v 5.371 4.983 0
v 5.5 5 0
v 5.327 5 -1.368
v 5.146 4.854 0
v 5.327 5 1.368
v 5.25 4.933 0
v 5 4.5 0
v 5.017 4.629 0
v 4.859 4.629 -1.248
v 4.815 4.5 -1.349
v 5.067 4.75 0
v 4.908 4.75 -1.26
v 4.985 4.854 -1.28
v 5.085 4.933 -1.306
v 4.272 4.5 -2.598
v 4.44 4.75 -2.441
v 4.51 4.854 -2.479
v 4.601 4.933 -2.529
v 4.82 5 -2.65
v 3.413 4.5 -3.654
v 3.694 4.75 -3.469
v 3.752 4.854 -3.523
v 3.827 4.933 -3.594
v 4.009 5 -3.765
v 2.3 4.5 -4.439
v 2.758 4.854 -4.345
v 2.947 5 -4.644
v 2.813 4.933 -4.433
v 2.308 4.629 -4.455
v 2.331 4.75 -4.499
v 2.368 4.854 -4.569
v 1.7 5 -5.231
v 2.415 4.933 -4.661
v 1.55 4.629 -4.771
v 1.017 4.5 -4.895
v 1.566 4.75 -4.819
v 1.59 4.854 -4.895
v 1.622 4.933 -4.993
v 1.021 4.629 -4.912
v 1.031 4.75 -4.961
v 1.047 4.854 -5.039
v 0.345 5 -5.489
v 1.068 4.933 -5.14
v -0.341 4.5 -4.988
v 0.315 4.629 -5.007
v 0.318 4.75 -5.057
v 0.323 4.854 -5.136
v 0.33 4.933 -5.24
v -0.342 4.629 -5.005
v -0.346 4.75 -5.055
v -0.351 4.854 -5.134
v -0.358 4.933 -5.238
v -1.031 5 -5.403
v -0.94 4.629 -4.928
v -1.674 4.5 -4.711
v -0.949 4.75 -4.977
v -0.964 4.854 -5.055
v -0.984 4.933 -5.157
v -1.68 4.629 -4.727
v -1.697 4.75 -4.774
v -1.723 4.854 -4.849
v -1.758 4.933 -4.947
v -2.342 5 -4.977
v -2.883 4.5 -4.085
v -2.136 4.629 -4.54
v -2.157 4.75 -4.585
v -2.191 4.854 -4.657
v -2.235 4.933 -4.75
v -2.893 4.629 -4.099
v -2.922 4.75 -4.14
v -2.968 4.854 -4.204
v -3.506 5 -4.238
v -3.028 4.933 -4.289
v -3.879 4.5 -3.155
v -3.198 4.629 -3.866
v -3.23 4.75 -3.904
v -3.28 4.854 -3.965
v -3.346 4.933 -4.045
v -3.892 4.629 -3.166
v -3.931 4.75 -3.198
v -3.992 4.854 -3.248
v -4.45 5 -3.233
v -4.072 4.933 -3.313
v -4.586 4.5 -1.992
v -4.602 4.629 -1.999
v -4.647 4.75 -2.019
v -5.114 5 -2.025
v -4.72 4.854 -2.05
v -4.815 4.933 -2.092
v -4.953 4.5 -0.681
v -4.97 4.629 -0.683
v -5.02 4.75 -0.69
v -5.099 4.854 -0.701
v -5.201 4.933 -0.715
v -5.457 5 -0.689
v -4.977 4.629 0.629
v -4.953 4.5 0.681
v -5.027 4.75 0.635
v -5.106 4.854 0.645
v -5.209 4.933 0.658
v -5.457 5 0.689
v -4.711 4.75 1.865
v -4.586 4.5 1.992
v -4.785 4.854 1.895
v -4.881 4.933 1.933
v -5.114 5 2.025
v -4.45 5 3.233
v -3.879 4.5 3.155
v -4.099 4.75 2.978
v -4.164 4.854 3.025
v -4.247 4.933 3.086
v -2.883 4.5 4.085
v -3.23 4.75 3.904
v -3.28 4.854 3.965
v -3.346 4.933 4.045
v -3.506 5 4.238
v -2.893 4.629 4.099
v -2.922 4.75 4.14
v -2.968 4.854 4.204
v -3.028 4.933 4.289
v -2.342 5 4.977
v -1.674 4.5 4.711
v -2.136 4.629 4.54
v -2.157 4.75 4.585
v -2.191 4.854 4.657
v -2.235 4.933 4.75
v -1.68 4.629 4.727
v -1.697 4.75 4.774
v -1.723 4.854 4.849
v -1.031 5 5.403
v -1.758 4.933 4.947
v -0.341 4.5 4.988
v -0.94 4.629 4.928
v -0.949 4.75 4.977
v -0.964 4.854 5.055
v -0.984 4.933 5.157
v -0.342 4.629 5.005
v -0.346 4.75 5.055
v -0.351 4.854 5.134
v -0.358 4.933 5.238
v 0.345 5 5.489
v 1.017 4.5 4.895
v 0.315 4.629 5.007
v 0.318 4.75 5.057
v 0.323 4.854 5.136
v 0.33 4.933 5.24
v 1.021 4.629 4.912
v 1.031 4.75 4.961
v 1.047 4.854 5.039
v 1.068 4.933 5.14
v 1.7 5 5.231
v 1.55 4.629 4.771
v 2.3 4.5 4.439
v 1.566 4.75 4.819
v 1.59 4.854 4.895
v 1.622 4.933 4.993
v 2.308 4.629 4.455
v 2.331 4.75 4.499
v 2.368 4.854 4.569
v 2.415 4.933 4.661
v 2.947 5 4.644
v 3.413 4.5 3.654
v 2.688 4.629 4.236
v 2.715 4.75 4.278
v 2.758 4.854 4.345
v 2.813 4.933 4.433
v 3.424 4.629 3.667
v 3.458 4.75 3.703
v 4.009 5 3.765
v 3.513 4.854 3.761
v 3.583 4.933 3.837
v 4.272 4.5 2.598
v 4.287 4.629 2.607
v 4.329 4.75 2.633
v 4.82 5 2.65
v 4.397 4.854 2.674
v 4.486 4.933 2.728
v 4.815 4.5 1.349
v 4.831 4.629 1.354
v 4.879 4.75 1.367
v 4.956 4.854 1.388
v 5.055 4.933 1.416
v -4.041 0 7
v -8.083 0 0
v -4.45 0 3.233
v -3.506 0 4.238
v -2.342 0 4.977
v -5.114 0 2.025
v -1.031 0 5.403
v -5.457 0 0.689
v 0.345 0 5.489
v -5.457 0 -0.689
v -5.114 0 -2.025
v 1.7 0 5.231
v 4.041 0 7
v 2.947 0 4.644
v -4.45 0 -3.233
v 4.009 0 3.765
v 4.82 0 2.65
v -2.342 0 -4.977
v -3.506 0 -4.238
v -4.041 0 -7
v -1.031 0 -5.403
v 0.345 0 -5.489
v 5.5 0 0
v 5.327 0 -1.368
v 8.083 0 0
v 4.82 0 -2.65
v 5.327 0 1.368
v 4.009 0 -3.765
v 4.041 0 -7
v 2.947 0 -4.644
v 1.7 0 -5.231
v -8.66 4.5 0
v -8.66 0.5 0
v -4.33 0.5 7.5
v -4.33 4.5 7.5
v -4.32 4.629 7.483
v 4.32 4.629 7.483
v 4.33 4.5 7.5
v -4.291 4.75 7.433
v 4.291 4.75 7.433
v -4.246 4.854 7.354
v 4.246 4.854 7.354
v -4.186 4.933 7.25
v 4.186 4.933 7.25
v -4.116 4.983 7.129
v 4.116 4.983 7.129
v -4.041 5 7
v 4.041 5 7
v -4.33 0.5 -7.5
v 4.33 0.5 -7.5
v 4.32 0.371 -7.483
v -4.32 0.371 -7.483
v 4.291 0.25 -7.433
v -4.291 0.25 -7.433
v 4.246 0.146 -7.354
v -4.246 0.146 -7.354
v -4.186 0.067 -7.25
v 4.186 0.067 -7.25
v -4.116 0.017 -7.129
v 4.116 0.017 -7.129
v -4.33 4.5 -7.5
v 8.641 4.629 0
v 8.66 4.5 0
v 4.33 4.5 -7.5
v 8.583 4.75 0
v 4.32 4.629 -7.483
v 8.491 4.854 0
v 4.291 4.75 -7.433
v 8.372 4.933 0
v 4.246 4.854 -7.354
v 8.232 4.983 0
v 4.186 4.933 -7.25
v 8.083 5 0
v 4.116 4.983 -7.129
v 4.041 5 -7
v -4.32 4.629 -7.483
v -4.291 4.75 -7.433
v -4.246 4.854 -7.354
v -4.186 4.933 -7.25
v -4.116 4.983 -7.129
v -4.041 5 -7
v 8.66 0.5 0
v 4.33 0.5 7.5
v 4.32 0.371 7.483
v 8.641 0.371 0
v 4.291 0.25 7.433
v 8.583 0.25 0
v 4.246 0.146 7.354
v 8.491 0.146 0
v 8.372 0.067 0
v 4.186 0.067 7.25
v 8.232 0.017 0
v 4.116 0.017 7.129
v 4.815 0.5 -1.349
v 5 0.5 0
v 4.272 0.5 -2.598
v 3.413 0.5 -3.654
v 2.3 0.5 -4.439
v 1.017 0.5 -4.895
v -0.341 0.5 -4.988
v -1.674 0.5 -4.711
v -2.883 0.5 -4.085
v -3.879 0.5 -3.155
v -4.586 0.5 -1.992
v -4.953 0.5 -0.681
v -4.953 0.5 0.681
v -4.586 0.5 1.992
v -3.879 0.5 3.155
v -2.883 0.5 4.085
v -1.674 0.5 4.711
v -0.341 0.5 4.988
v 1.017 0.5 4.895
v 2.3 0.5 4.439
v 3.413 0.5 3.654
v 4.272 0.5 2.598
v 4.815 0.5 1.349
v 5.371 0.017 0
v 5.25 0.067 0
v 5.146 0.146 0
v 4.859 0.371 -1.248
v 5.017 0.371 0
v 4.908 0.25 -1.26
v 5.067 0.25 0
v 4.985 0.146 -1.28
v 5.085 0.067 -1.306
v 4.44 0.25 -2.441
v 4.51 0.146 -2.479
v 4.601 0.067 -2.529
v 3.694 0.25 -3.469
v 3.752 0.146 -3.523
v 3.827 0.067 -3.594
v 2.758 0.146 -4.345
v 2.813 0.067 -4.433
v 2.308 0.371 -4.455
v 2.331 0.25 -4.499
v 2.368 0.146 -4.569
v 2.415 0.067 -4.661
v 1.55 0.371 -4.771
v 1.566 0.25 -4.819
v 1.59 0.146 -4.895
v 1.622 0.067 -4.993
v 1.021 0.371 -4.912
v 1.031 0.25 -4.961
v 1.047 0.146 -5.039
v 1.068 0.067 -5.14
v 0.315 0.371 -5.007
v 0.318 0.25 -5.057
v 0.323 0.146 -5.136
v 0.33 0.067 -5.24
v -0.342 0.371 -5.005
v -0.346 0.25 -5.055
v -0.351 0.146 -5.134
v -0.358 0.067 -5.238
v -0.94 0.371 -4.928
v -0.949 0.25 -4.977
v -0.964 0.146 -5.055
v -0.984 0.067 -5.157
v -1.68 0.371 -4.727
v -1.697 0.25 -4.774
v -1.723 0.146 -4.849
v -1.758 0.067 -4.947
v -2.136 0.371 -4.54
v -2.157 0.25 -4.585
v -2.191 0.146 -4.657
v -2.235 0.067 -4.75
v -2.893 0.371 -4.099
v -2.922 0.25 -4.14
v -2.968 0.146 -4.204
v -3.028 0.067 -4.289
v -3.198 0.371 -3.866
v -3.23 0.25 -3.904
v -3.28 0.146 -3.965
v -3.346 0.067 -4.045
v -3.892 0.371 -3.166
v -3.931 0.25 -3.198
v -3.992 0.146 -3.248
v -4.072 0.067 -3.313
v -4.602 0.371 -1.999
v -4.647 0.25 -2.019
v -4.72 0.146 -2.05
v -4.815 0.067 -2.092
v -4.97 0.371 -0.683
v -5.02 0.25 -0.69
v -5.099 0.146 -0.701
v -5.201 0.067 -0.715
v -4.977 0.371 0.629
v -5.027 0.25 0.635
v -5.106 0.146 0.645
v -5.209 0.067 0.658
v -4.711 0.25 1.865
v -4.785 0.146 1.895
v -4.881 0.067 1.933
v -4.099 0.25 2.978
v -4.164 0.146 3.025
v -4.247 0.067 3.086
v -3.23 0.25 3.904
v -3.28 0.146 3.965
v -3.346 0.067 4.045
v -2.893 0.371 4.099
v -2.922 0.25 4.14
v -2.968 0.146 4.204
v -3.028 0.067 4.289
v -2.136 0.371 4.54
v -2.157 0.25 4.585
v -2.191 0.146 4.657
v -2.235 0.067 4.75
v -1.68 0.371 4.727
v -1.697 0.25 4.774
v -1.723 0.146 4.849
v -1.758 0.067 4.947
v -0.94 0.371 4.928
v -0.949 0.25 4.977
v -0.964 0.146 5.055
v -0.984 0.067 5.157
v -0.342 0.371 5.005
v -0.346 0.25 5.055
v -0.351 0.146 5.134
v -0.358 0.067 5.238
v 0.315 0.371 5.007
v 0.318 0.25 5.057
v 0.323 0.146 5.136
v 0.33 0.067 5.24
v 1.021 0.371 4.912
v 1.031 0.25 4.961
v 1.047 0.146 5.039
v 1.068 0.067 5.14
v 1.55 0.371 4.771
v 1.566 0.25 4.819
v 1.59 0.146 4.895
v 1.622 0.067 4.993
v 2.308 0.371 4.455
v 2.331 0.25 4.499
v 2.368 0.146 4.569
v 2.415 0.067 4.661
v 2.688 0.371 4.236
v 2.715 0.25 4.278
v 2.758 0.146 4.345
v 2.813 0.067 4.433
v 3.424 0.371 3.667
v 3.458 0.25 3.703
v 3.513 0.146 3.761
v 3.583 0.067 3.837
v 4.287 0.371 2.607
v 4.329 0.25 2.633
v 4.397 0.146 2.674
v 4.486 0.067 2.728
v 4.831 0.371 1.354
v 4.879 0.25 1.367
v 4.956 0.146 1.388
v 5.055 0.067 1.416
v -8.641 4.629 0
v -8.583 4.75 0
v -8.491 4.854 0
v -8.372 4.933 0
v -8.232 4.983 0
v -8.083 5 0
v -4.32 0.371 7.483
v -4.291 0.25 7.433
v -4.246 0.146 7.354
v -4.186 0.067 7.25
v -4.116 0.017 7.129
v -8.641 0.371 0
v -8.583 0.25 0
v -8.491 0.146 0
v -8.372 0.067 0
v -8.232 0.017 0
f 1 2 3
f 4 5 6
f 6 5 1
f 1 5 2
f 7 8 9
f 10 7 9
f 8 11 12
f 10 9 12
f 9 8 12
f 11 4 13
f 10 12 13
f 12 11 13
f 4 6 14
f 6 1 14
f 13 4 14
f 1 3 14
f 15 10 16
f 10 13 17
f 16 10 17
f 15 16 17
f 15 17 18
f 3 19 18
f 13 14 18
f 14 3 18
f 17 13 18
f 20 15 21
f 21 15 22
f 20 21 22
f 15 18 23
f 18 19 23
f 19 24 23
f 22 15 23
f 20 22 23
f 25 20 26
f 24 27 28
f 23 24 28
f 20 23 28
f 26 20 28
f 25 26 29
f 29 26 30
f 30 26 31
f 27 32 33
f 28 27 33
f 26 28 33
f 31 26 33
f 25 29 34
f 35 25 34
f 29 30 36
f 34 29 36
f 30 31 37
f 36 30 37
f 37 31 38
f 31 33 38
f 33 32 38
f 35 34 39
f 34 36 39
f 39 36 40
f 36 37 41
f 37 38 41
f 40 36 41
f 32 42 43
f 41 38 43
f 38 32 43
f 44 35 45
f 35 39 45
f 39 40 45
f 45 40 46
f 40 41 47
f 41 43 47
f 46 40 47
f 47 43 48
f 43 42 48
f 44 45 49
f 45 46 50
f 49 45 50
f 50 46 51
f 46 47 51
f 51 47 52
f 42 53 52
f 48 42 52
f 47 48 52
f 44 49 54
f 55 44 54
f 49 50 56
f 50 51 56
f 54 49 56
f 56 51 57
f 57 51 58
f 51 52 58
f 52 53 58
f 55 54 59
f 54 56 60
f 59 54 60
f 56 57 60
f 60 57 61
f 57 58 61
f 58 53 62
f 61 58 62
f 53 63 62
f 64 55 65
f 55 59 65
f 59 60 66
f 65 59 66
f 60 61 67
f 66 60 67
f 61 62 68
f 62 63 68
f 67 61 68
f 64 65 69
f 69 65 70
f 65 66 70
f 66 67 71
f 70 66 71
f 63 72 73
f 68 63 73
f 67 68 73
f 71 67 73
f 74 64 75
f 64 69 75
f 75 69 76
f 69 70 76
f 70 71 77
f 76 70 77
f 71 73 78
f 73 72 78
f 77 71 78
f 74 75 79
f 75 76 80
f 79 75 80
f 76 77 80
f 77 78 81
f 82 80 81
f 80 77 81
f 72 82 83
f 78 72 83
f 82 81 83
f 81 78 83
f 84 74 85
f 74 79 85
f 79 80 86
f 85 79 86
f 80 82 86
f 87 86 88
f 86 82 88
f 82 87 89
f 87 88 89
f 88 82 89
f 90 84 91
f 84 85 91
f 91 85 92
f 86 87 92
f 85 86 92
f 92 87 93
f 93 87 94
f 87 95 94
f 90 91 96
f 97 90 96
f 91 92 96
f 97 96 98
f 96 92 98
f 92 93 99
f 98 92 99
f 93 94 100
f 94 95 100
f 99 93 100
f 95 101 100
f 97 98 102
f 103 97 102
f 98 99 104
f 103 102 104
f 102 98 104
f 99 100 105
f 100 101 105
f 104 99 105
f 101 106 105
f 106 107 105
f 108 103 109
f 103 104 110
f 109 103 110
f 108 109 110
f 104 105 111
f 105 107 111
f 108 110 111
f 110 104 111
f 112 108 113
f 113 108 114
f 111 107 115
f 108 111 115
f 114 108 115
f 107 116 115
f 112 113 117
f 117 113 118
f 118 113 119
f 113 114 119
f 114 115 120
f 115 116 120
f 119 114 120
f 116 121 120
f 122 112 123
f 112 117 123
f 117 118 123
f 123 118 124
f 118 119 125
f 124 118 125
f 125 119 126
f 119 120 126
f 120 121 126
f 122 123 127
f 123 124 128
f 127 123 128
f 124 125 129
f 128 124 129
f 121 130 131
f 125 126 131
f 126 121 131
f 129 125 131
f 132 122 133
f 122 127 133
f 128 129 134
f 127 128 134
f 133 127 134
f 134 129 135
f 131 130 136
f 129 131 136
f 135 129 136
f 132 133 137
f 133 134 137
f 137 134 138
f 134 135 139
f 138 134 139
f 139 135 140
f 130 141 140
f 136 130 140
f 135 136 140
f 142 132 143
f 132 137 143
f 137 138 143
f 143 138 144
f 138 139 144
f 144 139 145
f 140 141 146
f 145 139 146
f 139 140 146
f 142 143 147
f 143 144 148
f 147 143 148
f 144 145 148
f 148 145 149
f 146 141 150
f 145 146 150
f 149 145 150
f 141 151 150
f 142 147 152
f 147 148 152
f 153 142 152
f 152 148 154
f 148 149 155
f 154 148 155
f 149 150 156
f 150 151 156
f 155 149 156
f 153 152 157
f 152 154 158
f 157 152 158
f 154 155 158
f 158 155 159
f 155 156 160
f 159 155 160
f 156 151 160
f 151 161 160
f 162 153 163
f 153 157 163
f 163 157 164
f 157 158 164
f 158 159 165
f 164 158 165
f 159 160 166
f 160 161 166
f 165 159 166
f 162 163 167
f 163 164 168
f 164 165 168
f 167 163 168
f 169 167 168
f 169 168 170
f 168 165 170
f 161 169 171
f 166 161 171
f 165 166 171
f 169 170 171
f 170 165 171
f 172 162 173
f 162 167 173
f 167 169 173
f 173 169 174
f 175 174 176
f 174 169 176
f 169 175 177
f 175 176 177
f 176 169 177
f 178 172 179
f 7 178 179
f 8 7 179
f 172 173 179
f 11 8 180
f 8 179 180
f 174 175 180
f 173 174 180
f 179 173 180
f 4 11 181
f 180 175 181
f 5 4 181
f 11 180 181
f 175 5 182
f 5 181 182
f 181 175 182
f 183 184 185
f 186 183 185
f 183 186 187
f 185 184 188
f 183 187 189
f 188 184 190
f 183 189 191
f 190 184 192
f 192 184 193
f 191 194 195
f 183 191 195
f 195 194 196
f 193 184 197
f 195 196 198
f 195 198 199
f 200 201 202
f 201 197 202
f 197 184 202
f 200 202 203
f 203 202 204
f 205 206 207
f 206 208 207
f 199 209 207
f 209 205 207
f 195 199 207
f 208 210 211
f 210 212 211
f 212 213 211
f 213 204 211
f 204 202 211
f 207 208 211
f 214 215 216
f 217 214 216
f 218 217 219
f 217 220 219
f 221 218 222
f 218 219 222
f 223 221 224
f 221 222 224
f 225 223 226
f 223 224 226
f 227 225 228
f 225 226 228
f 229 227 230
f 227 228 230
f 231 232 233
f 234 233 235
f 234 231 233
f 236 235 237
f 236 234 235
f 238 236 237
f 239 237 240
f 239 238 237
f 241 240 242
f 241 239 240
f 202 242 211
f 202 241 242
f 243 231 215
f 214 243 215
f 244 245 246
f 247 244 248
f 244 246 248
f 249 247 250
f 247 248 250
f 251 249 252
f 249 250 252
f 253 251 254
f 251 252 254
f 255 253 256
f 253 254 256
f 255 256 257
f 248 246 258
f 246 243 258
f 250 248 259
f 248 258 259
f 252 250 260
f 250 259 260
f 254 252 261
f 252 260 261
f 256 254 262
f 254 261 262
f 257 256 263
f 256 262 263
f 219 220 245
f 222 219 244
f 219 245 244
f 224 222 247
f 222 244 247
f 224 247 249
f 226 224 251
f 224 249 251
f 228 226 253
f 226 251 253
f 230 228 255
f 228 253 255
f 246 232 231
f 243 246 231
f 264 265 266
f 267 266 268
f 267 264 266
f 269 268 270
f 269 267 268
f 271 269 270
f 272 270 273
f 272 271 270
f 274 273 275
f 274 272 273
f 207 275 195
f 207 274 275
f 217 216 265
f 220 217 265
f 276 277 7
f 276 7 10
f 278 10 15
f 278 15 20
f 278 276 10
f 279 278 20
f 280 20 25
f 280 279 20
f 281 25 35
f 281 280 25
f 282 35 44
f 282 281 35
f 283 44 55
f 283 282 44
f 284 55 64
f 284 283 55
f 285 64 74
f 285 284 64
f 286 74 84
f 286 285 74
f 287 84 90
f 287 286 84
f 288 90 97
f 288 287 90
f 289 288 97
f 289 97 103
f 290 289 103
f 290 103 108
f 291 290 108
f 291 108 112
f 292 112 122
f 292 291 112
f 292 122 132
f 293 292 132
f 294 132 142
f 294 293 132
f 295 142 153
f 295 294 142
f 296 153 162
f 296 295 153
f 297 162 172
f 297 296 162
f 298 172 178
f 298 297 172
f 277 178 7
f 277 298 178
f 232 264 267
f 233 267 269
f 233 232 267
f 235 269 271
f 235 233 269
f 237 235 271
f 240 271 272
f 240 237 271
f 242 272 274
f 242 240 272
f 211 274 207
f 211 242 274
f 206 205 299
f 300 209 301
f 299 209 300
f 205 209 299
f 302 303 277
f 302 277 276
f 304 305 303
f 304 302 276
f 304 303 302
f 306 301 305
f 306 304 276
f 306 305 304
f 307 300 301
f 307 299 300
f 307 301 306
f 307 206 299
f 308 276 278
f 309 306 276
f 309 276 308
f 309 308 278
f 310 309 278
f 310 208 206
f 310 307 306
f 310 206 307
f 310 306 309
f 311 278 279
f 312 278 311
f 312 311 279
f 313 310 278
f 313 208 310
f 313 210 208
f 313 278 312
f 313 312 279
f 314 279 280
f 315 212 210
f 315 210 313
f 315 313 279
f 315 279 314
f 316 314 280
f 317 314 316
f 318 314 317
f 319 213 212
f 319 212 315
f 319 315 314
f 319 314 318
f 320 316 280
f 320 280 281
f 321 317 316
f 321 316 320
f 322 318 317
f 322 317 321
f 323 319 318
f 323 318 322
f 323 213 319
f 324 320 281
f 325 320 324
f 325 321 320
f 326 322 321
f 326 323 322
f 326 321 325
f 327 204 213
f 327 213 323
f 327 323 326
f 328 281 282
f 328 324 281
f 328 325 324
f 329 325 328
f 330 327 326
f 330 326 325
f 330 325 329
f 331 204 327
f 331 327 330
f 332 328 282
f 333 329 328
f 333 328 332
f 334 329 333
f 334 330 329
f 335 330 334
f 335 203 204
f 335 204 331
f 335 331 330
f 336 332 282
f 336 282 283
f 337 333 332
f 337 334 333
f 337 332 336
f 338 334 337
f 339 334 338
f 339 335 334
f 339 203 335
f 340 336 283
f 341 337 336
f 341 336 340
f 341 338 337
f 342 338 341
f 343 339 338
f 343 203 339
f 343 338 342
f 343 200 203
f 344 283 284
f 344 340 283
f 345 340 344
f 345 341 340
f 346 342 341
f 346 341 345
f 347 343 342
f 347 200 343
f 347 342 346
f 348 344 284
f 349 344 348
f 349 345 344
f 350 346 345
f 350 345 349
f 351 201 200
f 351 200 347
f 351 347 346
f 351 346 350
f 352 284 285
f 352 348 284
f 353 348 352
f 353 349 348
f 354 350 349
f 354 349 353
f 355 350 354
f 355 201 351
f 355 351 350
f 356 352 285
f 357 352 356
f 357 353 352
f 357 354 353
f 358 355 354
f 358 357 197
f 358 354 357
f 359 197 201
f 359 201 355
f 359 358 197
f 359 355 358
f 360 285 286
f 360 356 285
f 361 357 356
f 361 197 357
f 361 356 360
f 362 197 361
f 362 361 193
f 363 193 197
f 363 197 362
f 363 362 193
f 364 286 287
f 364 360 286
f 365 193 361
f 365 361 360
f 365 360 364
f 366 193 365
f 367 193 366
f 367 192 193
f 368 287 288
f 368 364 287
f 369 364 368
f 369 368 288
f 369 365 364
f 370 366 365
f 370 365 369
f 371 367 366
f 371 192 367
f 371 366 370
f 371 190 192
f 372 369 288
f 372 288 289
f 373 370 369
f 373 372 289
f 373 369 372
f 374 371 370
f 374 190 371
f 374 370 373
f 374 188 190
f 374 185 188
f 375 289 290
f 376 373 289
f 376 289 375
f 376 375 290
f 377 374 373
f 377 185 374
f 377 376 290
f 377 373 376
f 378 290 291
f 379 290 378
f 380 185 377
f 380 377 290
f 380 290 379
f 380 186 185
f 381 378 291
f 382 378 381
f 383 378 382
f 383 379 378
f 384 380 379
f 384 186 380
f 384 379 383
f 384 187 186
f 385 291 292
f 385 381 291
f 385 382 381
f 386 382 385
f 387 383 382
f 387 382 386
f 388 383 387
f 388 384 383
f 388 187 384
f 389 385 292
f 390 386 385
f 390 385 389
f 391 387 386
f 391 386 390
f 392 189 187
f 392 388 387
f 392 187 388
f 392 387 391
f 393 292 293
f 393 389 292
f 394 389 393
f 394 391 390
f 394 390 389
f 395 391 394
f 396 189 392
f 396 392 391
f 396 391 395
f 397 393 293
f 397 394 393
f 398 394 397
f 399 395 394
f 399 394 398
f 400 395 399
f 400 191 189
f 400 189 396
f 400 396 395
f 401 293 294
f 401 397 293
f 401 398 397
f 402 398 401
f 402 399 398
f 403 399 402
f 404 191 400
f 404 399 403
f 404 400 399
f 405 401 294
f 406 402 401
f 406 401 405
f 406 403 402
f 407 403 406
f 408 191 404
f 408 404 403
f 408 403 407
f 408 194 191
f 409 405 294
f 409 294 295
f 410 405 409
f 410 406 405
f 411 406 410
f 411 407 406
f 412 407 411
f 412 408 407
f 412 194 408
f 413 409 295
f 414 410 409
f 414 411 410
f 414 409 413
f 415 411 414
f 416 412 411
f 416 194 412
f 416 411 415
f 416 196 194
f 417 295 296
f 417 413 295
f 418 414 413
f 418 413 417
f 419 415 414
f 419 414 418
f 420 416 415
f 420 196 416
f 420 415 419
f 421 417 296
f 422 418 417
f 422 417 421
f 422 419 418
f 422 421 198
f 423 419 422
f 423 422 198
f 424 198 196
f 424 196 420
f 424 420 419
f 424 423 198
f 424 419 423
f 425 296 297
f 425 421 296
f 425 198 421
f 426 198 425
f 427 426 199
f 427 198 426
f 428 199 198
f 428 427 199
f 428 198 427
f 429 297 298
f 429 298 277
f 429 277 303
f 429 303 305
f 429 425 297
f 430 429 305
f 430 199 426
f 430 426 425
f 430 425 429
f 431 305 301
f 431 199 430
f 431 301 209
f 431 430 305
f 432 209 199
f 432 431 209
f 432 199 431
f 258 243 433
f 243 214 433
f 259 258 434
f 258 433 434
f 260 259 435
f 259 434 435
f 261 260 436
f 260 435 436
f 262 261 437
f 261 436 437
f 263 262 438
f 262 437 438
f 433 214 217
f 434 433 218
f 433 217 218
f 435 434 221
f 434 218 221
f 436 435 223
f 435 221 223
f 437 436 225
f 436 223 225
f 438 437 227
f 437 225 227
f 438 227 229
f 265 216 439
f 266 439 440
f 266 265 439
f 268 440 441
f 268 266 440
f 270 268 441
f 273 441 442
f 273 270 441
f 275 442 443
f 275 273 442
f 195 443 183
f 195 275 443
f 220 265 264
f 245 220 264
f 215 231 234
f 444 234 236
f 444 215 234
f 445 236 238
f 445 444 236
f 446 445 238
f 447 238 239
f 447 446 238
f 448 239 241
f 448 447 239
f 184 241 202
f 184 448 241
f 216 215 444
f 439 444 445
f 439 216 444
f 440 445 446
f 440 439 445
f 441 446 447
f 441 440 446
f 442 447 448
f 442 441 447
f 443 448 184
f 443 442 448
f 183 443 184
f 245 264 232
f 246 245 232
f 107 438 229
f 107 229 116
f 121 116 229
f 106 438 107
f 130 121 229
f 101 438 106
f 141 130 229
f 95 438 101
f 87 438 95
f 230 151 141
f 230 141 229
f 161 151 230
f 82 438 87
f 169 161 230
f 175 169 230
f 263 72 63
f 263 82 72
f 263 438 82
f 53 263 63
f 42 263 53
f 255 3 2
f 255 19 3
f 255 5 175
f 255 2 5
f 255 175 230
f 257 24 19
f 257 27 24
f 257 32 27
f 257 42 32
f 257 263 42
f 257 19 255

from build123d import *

# Parameters (mm, degrees)
SKETCH1_R           = 5
BOSS_EXTRUDE1_DEPTH = 5
FILLET1_R           = 0.5


with BuildPart() as part:
    # Sketch1 → Boss-Extrude1 (new body)
    with BuildSketch(Plane(origin=(0, 0, 0), x_dir=(1, 0, 0), z_dir=(0, 1, 0))):
        Polygon((4.330127019, -7.5), (8.660254038, 0), (4.330127019, 7.5), (-4.330127019, 7.5), (-8.660254038, 0), (-4.330127019, -7.5), align=None)
        Circle(SKETCH1_R, mode=Mode.SUBTRACT)
    extrude(amount=BOSS_EXTRUDE1_DEPTH)

    # Fillet1
    fillet1_edges = [part.edges().sort_by_distance(p)[0] for p in [
        (6.495190528, 5, -3.75),
        (0, 5, -7.5),
        (-6.495190528, 5, -3.75),
        (-5, 0, 0),
        (-5, 5, 0),
        (-6.495190528, 5, 3.75),
        (0, 5, 7.5),
        (-6.495190528, 0, 3.75),
        (-6.495190528, 0, -3.75),
        (0, 0, -7.5),
        (6.495190528, 5, 3.75),
        (6.495190528, 0, -3.75),
        (6.495190528, 0, 3.75),
        (0, 0, 7.5),
    ]]
    fillet(fillet1_edges, radius=FILLET1_R)


solid = part.part
